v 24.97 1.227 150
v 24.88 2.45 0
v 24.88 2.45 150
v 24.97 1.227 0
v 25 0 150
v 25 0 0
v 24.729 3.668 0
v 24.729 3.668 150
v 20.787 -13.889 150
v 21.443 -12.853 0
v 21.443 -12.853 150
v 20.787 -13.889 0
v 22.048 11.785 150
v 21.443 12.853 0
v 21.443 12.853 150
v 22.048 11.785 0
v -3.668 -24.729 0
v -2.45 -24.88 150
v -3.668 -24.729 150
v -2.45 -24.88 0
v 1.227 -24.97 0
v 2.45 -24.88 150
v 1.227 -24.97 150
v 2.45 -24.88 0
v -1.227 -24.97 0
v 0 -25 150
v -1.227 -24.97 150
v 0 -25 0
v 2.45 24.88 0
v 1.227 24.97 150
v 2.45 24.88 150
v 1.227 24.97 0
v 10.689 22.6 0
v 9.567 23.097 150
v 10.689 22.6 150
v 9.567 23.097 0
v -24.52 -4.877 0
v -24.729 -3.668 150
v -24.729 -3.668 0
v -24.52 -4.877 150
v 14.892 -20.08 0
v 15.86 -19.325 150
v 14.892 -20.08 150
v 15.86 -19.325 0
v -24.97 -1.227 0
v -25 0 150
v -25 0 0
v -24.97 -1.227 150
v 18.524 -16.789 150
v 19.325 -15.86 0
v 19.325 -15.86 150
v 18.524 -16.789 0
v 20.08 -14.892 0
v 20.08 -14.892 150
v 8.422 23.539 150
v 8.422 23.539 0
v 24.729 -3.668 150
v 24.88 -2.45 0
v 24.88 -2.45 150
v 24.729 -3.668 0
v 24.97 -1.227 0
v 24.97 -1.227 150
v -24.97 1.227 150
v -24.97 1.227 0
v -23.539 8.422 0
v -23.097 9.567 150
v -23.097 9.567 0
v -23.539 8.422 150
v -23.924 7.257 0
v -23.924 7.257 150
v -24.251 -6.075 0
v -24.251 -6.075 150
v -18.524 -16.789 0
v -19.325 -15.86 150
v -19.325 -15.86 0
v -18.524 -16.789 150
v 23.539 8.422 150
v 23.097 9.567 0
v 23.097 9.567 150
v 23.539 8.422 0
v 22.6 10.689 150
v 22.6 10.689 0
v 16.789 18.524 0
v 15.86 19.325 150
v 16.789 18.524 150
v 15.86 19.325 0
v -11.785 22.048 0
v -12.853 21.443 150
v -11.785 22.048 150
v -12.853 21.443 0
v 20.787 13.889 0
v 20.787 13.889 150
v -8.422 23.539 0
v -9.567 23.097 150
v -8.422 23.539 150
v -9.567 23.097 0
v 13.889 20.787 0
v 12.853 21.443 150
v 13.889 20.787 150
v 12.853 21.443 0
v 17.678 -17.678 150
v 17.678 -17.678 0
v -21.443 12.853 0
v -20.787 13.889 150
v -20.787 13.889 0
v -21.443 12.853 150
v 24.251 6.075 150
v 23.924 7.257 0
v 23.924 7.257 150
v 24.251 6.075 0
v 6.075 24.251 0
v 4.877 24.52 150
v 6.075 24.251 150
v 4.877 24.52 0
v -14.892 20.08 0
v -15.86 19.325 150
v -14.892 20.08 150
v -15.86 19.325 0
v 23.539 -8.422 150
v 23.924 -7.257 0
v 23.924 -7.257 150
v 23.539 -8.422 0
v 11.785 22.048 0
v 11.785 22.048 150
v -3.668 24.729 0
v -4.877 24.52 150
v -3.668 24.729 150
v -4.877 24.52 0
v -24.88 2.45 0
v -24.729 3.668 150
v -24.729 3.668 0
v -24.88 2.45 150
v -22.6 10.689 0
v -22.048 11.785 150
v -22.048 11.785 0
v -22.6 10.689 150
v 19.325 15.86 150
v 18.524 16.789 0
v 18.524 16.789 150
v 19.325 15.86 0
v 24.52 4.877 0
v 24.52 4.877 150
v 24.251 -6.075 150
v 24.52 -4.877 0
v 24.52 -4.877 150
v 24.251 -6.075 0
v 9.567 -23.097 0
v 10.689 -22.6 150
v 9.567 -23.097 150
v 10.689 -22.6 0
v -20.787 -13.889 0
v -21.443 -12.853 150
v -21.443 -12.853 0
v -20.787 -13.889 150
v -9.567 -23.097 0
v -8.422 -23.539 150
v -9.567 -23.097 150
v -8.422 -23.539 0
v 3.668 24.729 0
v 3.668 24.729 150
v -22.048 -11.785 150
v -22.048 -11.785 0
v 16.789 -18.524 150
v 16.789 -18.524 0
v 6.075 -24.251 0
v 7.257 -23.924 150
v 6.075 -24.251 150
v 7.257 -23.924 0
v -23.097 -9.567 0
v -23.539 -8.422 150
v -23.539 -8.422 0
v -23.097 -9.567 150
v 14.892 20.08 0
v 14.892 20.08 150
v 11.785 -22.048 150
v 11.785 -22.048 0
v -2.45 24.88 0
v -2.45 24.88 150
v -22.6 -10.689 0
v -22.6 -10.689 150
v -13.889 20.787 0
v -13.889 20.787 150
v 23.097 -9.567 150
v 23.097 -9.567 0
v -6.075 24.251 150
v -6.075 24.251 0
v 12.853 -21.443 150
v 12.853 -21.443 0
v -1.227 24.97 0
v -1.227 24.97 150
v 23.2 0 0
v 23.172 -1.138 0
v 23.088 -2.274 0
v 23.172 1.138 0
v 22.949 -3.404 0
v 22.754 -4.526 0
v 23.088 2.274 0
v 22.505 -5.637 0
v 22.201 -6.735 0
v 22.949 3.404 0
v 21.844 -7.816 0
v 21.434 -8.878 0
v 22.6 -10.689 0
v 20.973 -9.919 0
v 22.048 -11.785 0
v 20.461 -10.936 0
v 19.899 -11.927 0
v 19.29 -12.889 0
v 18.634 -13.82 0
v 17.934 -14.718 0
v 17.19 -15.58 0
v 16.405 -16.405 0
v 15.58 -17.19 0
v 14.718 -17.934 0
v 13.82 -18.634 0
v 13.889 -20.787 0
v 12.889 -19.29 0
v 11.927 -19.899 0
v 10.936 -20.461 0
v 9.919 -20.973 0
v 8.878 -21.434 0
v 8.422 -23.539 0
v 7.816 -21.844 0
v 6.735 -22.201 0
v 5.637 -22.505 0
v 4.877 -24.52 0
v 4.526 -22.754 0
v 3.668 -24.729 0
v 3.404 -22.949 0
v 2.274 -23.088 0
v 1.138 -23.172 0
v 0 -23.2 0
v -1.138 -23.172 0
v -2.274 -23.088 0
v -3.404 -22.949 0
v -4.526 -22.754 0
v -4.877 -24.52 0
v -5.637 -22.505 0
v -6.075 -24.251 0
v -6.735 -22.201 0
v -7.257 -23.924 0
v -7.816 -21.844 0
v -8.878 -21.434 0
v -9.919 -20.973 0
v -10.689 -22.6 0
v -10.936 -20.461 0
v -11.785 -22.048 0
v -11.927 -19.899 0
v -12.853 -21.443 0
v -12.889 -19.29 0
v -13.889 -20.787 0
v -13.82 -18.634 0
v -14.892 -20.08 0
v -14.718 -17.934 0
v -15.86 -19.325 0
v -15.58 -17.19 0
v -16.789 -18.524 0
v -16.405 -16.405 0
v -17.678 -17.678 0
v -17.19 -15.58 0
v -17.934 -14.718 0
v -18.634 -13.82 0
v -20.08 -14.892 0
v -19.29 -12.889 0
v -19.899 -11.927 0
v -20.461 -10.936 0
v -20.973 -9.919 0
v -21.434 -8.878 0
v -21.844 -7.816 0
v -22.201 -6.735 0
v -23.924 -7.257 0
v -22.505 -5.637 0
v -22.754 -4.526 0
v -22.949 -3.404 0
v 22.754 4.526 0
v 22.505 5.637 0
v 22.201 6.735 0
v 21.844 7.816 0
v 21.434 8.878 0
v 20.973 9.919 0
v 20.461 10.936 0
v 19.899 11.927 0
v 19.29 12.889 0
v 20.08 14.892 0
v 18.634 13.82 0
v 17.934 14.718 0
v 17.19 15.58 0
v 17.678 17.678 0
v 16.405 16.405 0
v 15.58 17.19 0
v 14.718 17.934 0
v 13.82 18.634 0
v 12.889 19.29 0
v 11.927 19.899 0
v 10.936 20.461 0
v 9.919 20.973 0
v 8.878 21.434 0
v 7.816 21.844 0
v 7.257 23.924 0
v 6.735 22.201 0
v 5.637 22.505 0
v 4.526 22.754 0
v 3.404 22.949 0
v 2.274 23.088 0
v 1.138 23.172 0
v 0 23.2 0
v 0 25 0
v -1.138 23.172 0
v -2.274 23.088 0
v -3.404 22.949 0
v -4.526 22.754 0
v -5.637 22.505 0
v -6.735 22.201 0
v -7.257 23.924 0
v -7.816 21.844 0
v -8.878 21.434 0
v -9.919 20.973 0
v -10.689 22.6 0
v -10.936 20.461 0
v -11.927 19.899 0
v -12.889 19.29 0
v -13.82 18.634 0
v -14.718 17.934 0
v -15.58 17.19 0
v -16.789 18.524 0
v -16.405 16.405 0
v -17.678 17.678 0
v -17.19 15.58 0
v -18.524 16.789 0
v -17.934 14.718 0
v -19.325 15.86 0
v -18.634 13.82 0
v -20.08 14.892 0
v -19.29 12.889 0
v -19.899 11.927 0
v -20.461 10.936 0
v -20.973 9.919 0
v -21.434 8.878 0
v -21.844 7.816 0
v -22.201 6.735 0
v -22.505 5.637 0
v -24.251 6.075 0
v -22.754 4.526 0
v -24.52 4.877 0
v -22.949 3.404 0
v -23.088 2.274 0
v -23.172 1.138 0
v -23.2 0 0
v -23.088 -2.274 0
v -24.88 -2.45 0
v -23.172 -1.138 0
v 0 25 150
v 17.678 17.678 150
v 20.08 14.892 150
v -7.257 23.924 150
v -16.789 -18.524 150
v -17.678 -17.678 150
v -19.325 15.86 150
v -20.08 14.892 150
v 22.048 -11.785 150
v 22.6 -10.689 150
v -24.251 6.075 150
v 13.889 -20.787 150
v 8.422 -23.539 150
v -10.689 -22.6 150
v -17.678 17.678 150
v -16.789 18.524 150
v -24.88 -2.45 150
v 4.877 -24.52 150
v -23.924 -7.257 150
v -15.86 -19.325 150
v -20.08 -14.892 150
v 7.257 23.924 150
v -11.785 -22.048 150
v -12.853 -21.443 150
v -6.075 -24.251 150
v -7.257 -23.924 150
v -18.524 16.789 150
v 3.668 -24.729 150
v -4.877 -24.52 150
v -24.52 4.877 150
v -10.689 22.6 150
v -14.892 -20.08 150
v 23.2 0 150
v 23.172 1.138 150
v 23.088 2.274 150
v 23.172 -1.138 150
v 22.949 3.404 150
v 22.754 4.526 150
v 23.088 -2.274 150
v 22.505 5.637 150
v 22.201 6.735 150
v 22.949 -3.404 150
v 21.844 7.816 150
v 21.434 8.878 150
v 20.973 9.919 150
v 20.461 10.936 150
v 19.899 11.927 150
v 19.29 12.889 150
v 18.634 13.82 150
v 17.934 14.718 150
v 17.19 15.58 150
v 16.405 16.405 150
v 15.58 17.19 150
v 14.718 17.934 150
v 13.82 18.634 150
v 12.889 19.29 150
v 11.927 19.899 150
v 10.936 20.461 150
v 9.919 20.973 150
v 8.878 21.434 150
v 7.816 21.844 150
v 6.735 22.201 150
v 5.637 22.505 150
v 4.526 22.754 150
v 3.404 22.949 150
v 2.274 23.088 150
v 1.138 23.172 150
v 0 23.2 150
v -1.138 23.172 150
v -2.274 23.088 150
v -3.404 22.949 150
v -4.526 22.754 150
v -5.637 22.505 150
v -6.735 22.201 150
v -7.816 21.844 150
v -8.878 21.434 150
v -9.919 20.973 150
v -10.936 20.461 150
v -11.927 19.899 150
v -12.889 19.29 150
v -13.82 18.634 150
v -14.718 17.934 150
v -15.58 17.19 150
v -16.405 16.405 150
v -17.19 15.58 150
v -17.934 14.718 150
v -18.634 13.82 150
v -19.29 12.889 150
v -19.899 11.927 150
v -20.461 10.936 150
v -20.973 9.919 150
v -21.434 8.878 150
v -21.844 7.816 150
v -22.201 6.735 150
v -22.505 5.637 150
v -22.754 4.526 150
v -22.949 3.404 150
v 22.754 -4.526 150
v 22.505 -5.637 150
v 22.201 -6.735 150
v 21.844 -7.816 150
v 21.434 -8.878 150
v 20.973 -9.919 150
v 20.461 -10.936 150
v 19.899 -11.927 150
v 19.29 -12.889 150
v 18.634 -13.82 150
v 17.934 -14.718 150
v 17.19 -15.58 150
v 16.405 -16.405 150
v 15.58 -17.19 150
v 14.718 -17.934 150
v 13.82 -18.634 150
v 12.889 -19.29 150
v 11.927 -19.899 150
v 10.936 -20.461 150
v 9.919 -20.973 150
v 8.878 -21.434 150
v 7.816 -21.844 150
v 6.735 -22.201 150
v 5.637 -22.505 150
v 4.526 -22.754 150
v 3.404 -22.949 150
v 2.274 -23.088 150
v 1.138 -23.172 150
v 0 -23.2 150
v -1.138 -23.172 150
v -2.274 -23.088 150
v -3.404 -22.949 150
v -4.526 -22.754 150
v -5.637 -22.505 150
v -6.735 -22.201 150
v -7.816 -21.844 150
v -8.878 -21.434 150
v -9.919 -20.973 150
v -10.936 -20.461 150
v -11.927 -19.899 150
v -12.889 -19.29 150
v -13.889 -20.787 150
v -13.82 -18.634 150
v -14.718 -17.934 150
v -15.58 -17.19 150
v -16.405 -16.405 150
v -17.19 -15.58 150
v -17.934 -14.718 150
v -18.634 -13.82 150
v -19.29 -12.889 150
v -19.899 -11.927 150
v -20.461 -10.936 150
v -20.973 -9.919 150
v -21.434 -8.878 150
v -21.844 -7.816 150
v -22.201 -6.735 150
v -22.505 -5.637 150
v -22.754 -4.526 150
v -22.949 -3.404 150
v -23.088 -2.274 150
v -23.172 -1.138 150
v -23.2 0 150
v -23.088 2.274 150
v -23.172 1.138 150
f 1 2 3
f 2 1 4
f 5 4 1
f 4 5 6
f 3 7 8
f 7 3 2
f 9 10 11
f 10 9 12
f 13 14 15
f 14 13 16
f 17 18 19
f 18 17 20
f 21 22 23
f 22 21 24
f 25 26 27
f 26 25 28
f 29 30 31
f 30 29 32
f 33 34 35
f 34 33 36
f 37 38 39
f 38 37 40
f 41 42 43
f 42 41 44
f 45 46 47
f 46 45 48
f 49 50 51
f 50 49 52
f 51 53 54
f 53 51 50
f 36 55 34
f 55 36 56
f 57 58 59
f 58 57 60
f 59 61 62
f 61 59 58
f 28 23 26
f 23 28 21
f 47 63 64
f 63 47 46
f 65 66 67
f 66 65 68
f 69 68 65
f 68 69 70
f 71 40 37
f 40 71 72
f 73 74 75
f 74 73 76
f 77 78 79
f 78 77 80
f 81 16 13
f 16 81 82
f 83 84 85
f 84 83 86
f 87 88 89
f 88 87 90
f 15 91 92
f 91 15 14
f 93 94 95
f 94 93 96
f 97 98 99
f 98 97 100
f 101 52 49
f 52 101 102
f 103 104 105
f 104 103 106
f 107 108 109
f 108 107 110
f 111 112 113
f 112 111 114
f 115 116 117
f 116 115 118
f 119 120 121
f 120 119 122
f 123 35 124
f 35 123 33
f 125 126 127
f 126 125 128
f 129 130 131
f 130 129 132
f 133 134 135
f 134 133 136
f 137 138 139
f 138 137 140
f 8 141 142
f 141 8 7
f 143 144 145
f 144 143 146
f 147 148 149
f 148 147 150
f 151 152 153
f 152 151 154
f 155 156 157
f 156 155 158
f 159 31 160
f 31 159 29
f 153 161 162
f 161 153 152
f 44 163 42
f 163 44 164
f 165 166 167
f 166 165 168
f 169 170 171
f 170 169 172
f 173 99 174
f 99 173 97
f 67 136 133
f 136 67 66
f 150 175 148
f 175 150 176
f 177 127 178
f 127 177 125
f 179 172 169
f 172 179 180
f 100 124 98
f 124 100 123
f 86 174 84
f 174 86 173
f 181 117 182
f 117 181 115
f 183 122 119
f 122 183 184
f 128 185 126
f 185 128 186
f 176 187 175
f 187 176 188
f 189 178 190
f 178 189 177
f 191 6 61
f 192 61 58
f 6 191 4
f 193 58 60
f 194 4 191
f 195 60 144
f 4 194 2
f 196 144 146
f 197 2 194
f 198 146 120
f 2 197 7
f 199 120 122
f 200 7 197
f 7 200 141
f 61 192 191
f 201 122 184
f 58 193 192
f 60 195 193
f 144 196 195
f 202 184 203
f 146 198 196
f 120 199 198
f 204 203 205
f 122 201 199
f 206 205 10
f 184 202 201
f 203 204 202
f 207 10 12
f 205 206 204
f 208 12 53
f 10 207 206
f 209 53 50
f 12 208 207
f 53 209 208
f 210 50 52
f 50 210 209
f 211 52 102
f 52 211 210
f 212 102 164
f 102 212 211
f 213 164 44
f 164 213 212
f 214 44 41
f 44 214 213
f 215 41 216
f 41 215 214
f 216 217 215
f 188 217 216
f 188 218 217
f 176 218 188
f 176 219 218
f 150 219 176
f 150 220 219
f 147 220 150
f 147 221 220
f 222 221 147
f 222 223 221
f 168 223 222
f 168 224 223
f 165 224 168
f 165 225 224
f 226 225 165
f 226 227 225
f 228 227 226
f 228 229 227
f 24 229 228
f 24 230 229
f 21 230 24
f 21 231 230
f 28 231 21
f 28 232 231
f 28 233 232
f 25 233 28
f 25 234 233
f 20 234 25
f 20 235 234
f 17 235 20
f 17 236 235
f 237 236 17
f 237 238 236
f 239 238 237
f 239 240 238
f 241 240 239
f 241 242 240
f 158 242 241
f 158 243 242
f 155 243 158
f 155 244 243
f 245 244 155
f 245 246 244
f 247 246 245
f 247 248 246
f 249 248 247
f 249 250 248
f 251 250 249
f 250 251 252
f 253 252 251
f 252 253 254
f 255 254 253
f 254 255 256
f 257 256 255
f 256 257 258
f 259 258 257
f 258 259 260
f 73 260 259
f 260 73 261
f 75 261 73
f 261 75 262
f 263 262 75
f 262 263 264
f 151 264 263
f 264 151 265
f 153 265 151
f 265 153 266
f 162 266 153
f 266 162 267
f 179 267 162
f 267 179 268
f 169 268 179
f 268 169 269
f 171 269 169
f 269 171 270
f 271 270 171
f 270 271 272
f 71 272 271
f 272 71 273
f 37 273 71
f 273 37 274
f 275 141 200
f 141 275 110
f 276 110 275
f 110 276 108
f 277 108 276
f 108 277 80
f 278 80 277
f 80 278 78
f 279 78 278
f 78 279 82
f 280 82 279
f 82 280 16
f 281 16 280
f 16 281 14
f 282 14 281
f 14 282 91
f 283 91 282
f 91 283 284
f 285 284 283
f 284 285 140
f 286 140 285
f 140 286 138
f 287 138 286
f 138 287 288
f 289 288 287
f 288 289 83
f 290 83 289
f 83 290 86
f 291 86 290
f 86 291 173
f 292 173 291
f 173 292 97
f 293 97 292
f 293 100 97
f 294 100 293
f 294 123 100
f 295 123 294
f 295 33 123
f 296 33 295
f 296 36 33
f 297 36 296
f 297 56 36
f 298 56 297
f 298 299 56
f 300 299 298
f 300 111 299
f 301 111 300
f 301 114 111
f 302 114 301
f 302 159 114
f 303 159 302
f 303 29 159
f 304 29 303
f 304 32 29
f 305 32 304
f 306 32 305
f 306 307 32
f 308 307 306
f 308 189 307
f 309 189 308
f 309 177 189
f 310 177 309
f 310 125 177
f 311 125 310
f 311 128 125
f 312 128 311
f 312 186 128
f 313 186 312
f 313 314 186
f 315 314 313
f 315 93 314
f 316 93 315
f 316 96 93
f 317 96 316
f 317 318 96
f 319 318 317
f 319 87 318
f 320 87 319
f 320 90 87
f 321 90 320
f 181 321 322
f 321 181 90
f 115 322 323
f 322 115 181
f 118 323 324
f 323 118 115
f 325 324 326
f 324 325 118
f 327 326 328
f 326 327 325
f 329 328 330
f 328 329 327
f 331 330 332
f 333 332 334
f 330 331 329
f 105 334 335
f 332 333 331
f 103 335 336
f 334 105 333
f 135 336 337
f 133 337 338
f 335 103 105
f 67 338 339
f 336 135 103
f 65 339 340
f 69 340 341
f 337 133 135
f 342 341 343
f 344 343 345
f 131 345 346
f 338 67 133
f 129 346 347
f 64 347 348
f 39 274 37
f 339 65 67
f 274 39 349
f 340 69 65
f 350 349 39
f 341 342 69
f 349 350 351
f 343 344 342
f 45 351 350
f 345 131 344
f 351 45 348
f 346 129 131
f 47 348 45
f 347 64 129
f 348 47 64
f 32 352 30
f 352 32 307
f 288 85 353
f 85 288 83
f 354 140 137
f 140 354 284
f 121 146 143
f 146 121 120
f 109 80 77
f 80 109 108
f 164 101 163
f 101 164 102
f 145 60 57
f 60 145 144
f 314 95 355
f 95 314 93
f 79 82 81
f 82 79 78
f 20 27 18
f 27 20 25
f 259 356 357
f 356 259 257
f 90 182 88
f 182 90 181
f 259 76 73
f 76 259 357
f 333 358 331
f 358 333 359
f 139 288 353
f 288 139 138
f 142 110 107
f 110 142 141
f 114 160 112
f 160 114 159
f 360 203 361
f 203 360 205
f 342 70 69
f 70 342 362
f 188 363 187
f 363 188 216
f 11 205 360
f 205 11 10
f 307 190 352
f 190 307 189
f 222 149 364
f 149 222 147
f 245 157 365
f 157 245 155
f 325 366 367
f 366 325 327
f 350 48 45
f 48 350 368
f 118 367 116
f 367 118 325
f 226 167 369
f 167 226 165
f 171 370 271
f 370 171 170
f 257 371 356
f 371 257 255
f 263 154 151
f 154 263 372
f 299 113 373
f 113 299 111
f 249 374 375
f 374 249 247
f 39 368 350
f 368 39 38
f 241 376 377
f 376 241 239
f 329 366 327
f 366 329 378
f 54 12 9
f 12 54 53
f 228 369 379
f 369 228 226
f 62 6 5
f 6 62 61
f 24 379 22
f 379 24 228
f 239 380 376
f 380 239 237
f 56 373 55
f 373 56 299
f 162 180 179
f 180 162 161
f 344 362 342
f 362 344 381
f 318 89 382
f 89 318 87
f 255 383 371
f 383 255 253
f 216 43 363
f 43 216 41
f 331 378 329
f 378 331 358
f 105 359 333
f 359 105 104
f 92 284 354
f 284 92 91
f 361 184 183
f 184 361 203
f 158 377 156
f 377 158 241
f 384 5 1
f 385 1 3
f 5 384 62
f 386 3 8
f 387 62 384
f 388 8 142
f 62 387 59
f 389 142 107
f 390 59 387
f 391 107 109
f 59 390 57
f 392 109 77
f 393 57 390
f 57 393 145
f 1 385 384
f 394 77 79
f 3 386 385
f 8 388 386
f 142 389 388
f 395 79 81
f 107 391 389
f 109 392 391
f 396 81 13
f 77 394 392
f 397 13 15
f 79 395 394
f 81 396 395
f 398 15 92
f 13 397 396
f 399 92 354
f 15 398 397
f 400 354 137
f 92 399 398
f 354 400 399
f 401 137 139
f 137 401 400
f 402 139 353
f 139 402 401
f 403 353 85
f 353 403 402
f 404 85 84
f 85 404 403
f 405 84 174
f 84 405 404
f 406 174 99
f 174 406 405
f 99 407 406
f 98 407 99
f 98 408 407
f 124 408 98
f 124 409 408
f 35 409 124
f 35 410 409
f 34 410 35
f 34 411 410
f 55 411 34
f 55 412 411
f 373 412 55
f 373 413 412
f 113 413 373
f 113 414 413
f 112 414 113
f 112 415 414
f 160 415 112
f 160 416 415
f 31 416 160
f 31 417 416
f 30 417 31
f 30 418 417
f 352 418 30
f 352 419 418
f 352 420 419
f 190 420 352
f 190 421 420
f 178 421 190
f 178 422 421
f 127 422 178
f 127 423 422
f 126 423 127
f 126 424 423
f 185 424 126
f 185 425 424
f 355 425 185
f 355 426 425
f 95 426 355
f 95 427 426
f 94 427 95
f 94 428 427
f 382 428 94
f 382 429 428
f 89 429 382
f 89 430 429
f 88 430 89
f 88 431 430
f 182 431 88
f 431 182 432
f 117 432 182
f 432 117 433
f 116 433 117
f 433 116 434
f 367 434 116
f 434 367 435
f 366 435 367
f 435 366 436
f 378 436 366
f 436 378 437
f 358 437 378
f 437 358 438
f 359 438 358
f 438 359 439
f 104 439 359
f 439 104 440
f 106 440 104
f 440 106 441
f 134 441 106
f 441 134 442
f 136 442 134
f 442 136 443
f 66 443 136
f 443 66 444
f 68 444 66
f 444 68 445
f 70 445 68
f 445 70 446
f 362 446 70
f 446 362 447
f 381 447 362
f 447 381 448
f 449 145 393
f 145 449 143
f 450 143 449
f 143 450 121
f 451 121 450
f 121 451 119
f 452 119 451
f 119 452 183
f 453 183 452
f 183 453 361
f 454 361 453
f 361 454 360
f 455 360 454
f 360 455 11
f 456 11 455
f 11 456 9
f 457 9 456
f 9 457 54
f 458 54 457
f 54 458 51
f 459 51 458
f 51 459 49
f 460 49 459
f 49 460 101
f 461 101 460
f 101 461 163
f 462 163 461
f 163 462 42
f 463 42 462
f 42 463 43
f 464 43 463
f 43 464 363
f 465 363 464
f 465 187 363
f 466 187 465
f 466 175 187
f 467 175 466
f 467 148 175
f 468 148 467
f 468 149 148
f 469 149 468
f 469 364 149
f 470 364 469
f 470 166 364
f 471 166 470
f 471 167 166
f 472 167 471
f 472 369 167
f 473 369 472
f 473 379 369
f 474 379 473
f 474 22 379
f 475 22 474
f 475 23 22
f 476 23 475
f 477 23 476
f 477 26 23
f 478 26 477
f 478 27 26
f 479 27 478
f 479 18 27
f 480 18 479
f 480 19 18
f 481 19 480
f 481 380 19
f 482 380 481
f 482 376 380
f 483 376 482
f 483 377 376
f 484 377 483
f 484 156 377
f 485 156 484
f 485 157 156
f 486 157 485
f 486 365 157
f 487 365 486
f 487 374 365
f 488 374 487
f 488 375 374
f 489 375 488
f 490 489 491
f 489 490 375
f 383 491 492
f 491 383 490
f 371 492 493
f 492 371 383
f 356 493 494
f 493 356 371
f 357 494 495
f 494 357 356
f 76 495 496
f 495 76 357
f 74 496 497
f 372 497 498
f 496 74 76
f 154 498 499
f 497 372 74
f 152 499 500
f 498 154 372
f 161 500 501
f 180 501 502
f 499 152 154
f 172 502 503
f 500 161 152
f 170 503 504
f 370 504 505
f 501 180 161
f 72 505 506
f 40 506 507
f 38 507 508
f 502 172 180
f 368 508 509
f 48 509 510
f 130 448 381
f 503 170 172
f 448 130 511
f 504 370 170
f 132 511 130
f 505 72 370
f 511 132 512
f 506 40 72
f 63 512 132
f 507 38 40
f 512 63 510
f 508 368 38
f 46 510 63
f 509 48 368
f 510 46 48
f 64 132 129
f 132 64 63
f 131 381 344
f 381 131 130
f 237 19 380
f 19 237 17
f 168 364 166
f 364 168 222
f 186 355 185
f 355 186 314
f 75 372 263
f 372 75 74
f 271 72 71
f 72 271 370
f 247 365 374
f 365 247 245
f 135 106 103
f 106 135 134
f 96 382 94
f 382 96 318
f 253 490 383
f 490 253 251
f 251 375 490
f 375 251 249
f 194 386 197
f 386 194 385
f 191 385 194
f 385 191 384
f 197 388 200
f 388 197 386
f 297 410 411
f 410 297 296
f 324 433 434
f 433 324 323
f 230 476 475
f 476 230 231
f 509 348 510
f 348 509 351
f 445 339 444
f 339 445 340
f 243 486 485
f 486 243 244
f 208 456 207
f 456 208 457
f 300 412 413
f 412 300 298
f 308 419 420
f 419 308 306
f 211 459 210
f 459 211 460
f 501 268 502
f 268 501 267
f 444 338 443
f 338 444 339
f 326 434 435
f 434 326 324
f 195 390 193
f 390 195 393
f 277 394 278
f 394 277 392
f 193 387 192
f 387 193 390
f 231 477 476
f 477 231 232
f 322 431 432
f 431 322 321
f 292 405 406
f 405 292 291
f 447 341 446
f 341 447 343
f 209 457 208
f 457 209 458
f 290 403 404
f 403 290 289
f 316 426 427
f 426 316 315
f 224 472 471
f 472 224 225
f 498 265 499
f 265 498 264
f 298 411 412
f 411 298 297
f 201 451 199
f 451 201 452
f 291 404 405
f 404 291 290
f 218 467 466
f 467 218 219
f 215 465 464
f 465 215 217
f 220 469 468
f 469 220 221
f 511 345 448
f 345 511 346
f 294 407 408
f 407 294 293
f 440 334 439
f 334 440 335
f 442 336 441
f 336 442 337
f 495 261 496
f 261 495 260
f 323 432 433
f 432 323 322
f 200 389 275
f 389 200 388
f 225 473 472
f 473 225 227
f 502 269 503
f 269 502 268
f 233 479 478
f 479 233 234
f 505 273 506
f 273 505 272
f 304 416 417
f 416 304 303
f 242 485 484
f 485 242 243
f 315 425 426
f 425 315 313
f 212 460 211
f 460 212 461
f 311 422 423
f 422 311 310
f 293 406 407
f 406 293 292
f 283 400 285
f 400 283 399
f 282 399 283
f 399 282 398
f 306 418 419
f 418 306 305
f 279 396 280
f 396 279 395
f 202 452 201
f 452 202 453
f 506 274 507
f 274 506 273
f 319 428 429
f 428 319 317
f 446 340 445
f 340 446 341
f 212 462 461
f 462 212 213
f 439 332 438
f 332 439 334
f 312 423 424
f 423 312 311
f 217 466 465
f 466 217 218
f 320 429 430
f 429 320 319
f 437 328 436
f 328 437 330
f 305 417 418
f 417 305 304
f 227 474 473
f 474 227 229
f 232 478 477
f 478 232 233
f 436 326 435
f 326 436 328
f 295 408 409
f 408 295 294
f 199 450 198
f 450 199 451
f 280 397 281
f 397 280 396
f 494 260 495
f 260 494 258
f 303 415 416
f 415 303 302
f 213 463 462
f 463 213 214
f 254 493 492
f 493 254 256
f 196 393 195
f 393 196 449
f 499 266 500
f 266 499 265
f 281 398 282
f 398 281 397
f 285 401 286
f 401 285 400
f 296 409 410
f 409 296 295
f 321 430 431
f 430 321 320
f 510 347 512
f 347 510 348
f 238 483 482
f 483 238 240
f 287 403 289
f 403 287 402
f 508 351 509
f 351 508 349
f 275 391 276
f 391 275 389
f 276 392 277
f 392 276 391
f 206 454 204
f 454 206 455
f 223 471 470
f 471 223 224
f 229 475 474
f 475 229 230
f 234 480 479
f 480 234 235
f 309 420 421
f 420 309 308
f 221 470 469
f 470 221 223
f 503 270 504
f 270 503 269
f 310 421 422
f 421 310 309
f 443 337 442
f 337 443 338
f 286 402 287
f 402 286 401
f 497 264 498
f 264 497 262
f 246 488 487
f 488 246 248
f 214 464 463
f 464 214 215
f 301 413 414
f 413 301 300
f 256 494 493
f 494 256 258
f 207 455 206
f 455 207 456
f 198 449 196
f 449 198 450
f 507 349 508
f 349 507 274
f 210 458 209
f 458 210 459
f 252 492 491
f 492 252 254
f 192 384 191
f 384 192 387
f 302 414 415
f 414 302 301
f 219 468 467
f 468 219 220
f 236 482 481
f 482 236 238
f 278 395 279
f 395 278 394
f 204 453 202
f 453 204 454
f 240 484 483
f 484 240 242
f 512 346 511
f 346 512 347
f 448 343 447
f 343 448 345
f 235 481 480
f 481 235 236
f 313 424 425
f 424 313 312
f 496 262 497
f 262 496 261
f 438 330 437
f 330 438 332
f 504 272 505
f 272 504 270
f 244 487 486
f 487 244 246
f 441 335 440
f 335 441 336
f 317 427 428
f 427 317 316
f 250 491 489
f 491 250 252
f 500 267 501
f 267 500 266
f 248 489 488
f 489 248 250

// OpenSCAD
$fn = 128;

// HT pipe parameters (approximate for HT 50)
pipe_length = 150;          // mm
outer_diameter = 50;        // mm (nominal)
wall_thickness = 1.8;       // mm (typical HT)
inner_diameter = outer_diameter - 2*wall_thickness;

module ht_pipe(od=50, id=46.4, L=150) {
    difference() {
        cylinder(h=L, d=od);
        translate([0,0,-0.5])
            cylinder(h=L+1, d=id);
    }
}

ht_pipe(outer_diameter, inner_diameter, pipe_length);
